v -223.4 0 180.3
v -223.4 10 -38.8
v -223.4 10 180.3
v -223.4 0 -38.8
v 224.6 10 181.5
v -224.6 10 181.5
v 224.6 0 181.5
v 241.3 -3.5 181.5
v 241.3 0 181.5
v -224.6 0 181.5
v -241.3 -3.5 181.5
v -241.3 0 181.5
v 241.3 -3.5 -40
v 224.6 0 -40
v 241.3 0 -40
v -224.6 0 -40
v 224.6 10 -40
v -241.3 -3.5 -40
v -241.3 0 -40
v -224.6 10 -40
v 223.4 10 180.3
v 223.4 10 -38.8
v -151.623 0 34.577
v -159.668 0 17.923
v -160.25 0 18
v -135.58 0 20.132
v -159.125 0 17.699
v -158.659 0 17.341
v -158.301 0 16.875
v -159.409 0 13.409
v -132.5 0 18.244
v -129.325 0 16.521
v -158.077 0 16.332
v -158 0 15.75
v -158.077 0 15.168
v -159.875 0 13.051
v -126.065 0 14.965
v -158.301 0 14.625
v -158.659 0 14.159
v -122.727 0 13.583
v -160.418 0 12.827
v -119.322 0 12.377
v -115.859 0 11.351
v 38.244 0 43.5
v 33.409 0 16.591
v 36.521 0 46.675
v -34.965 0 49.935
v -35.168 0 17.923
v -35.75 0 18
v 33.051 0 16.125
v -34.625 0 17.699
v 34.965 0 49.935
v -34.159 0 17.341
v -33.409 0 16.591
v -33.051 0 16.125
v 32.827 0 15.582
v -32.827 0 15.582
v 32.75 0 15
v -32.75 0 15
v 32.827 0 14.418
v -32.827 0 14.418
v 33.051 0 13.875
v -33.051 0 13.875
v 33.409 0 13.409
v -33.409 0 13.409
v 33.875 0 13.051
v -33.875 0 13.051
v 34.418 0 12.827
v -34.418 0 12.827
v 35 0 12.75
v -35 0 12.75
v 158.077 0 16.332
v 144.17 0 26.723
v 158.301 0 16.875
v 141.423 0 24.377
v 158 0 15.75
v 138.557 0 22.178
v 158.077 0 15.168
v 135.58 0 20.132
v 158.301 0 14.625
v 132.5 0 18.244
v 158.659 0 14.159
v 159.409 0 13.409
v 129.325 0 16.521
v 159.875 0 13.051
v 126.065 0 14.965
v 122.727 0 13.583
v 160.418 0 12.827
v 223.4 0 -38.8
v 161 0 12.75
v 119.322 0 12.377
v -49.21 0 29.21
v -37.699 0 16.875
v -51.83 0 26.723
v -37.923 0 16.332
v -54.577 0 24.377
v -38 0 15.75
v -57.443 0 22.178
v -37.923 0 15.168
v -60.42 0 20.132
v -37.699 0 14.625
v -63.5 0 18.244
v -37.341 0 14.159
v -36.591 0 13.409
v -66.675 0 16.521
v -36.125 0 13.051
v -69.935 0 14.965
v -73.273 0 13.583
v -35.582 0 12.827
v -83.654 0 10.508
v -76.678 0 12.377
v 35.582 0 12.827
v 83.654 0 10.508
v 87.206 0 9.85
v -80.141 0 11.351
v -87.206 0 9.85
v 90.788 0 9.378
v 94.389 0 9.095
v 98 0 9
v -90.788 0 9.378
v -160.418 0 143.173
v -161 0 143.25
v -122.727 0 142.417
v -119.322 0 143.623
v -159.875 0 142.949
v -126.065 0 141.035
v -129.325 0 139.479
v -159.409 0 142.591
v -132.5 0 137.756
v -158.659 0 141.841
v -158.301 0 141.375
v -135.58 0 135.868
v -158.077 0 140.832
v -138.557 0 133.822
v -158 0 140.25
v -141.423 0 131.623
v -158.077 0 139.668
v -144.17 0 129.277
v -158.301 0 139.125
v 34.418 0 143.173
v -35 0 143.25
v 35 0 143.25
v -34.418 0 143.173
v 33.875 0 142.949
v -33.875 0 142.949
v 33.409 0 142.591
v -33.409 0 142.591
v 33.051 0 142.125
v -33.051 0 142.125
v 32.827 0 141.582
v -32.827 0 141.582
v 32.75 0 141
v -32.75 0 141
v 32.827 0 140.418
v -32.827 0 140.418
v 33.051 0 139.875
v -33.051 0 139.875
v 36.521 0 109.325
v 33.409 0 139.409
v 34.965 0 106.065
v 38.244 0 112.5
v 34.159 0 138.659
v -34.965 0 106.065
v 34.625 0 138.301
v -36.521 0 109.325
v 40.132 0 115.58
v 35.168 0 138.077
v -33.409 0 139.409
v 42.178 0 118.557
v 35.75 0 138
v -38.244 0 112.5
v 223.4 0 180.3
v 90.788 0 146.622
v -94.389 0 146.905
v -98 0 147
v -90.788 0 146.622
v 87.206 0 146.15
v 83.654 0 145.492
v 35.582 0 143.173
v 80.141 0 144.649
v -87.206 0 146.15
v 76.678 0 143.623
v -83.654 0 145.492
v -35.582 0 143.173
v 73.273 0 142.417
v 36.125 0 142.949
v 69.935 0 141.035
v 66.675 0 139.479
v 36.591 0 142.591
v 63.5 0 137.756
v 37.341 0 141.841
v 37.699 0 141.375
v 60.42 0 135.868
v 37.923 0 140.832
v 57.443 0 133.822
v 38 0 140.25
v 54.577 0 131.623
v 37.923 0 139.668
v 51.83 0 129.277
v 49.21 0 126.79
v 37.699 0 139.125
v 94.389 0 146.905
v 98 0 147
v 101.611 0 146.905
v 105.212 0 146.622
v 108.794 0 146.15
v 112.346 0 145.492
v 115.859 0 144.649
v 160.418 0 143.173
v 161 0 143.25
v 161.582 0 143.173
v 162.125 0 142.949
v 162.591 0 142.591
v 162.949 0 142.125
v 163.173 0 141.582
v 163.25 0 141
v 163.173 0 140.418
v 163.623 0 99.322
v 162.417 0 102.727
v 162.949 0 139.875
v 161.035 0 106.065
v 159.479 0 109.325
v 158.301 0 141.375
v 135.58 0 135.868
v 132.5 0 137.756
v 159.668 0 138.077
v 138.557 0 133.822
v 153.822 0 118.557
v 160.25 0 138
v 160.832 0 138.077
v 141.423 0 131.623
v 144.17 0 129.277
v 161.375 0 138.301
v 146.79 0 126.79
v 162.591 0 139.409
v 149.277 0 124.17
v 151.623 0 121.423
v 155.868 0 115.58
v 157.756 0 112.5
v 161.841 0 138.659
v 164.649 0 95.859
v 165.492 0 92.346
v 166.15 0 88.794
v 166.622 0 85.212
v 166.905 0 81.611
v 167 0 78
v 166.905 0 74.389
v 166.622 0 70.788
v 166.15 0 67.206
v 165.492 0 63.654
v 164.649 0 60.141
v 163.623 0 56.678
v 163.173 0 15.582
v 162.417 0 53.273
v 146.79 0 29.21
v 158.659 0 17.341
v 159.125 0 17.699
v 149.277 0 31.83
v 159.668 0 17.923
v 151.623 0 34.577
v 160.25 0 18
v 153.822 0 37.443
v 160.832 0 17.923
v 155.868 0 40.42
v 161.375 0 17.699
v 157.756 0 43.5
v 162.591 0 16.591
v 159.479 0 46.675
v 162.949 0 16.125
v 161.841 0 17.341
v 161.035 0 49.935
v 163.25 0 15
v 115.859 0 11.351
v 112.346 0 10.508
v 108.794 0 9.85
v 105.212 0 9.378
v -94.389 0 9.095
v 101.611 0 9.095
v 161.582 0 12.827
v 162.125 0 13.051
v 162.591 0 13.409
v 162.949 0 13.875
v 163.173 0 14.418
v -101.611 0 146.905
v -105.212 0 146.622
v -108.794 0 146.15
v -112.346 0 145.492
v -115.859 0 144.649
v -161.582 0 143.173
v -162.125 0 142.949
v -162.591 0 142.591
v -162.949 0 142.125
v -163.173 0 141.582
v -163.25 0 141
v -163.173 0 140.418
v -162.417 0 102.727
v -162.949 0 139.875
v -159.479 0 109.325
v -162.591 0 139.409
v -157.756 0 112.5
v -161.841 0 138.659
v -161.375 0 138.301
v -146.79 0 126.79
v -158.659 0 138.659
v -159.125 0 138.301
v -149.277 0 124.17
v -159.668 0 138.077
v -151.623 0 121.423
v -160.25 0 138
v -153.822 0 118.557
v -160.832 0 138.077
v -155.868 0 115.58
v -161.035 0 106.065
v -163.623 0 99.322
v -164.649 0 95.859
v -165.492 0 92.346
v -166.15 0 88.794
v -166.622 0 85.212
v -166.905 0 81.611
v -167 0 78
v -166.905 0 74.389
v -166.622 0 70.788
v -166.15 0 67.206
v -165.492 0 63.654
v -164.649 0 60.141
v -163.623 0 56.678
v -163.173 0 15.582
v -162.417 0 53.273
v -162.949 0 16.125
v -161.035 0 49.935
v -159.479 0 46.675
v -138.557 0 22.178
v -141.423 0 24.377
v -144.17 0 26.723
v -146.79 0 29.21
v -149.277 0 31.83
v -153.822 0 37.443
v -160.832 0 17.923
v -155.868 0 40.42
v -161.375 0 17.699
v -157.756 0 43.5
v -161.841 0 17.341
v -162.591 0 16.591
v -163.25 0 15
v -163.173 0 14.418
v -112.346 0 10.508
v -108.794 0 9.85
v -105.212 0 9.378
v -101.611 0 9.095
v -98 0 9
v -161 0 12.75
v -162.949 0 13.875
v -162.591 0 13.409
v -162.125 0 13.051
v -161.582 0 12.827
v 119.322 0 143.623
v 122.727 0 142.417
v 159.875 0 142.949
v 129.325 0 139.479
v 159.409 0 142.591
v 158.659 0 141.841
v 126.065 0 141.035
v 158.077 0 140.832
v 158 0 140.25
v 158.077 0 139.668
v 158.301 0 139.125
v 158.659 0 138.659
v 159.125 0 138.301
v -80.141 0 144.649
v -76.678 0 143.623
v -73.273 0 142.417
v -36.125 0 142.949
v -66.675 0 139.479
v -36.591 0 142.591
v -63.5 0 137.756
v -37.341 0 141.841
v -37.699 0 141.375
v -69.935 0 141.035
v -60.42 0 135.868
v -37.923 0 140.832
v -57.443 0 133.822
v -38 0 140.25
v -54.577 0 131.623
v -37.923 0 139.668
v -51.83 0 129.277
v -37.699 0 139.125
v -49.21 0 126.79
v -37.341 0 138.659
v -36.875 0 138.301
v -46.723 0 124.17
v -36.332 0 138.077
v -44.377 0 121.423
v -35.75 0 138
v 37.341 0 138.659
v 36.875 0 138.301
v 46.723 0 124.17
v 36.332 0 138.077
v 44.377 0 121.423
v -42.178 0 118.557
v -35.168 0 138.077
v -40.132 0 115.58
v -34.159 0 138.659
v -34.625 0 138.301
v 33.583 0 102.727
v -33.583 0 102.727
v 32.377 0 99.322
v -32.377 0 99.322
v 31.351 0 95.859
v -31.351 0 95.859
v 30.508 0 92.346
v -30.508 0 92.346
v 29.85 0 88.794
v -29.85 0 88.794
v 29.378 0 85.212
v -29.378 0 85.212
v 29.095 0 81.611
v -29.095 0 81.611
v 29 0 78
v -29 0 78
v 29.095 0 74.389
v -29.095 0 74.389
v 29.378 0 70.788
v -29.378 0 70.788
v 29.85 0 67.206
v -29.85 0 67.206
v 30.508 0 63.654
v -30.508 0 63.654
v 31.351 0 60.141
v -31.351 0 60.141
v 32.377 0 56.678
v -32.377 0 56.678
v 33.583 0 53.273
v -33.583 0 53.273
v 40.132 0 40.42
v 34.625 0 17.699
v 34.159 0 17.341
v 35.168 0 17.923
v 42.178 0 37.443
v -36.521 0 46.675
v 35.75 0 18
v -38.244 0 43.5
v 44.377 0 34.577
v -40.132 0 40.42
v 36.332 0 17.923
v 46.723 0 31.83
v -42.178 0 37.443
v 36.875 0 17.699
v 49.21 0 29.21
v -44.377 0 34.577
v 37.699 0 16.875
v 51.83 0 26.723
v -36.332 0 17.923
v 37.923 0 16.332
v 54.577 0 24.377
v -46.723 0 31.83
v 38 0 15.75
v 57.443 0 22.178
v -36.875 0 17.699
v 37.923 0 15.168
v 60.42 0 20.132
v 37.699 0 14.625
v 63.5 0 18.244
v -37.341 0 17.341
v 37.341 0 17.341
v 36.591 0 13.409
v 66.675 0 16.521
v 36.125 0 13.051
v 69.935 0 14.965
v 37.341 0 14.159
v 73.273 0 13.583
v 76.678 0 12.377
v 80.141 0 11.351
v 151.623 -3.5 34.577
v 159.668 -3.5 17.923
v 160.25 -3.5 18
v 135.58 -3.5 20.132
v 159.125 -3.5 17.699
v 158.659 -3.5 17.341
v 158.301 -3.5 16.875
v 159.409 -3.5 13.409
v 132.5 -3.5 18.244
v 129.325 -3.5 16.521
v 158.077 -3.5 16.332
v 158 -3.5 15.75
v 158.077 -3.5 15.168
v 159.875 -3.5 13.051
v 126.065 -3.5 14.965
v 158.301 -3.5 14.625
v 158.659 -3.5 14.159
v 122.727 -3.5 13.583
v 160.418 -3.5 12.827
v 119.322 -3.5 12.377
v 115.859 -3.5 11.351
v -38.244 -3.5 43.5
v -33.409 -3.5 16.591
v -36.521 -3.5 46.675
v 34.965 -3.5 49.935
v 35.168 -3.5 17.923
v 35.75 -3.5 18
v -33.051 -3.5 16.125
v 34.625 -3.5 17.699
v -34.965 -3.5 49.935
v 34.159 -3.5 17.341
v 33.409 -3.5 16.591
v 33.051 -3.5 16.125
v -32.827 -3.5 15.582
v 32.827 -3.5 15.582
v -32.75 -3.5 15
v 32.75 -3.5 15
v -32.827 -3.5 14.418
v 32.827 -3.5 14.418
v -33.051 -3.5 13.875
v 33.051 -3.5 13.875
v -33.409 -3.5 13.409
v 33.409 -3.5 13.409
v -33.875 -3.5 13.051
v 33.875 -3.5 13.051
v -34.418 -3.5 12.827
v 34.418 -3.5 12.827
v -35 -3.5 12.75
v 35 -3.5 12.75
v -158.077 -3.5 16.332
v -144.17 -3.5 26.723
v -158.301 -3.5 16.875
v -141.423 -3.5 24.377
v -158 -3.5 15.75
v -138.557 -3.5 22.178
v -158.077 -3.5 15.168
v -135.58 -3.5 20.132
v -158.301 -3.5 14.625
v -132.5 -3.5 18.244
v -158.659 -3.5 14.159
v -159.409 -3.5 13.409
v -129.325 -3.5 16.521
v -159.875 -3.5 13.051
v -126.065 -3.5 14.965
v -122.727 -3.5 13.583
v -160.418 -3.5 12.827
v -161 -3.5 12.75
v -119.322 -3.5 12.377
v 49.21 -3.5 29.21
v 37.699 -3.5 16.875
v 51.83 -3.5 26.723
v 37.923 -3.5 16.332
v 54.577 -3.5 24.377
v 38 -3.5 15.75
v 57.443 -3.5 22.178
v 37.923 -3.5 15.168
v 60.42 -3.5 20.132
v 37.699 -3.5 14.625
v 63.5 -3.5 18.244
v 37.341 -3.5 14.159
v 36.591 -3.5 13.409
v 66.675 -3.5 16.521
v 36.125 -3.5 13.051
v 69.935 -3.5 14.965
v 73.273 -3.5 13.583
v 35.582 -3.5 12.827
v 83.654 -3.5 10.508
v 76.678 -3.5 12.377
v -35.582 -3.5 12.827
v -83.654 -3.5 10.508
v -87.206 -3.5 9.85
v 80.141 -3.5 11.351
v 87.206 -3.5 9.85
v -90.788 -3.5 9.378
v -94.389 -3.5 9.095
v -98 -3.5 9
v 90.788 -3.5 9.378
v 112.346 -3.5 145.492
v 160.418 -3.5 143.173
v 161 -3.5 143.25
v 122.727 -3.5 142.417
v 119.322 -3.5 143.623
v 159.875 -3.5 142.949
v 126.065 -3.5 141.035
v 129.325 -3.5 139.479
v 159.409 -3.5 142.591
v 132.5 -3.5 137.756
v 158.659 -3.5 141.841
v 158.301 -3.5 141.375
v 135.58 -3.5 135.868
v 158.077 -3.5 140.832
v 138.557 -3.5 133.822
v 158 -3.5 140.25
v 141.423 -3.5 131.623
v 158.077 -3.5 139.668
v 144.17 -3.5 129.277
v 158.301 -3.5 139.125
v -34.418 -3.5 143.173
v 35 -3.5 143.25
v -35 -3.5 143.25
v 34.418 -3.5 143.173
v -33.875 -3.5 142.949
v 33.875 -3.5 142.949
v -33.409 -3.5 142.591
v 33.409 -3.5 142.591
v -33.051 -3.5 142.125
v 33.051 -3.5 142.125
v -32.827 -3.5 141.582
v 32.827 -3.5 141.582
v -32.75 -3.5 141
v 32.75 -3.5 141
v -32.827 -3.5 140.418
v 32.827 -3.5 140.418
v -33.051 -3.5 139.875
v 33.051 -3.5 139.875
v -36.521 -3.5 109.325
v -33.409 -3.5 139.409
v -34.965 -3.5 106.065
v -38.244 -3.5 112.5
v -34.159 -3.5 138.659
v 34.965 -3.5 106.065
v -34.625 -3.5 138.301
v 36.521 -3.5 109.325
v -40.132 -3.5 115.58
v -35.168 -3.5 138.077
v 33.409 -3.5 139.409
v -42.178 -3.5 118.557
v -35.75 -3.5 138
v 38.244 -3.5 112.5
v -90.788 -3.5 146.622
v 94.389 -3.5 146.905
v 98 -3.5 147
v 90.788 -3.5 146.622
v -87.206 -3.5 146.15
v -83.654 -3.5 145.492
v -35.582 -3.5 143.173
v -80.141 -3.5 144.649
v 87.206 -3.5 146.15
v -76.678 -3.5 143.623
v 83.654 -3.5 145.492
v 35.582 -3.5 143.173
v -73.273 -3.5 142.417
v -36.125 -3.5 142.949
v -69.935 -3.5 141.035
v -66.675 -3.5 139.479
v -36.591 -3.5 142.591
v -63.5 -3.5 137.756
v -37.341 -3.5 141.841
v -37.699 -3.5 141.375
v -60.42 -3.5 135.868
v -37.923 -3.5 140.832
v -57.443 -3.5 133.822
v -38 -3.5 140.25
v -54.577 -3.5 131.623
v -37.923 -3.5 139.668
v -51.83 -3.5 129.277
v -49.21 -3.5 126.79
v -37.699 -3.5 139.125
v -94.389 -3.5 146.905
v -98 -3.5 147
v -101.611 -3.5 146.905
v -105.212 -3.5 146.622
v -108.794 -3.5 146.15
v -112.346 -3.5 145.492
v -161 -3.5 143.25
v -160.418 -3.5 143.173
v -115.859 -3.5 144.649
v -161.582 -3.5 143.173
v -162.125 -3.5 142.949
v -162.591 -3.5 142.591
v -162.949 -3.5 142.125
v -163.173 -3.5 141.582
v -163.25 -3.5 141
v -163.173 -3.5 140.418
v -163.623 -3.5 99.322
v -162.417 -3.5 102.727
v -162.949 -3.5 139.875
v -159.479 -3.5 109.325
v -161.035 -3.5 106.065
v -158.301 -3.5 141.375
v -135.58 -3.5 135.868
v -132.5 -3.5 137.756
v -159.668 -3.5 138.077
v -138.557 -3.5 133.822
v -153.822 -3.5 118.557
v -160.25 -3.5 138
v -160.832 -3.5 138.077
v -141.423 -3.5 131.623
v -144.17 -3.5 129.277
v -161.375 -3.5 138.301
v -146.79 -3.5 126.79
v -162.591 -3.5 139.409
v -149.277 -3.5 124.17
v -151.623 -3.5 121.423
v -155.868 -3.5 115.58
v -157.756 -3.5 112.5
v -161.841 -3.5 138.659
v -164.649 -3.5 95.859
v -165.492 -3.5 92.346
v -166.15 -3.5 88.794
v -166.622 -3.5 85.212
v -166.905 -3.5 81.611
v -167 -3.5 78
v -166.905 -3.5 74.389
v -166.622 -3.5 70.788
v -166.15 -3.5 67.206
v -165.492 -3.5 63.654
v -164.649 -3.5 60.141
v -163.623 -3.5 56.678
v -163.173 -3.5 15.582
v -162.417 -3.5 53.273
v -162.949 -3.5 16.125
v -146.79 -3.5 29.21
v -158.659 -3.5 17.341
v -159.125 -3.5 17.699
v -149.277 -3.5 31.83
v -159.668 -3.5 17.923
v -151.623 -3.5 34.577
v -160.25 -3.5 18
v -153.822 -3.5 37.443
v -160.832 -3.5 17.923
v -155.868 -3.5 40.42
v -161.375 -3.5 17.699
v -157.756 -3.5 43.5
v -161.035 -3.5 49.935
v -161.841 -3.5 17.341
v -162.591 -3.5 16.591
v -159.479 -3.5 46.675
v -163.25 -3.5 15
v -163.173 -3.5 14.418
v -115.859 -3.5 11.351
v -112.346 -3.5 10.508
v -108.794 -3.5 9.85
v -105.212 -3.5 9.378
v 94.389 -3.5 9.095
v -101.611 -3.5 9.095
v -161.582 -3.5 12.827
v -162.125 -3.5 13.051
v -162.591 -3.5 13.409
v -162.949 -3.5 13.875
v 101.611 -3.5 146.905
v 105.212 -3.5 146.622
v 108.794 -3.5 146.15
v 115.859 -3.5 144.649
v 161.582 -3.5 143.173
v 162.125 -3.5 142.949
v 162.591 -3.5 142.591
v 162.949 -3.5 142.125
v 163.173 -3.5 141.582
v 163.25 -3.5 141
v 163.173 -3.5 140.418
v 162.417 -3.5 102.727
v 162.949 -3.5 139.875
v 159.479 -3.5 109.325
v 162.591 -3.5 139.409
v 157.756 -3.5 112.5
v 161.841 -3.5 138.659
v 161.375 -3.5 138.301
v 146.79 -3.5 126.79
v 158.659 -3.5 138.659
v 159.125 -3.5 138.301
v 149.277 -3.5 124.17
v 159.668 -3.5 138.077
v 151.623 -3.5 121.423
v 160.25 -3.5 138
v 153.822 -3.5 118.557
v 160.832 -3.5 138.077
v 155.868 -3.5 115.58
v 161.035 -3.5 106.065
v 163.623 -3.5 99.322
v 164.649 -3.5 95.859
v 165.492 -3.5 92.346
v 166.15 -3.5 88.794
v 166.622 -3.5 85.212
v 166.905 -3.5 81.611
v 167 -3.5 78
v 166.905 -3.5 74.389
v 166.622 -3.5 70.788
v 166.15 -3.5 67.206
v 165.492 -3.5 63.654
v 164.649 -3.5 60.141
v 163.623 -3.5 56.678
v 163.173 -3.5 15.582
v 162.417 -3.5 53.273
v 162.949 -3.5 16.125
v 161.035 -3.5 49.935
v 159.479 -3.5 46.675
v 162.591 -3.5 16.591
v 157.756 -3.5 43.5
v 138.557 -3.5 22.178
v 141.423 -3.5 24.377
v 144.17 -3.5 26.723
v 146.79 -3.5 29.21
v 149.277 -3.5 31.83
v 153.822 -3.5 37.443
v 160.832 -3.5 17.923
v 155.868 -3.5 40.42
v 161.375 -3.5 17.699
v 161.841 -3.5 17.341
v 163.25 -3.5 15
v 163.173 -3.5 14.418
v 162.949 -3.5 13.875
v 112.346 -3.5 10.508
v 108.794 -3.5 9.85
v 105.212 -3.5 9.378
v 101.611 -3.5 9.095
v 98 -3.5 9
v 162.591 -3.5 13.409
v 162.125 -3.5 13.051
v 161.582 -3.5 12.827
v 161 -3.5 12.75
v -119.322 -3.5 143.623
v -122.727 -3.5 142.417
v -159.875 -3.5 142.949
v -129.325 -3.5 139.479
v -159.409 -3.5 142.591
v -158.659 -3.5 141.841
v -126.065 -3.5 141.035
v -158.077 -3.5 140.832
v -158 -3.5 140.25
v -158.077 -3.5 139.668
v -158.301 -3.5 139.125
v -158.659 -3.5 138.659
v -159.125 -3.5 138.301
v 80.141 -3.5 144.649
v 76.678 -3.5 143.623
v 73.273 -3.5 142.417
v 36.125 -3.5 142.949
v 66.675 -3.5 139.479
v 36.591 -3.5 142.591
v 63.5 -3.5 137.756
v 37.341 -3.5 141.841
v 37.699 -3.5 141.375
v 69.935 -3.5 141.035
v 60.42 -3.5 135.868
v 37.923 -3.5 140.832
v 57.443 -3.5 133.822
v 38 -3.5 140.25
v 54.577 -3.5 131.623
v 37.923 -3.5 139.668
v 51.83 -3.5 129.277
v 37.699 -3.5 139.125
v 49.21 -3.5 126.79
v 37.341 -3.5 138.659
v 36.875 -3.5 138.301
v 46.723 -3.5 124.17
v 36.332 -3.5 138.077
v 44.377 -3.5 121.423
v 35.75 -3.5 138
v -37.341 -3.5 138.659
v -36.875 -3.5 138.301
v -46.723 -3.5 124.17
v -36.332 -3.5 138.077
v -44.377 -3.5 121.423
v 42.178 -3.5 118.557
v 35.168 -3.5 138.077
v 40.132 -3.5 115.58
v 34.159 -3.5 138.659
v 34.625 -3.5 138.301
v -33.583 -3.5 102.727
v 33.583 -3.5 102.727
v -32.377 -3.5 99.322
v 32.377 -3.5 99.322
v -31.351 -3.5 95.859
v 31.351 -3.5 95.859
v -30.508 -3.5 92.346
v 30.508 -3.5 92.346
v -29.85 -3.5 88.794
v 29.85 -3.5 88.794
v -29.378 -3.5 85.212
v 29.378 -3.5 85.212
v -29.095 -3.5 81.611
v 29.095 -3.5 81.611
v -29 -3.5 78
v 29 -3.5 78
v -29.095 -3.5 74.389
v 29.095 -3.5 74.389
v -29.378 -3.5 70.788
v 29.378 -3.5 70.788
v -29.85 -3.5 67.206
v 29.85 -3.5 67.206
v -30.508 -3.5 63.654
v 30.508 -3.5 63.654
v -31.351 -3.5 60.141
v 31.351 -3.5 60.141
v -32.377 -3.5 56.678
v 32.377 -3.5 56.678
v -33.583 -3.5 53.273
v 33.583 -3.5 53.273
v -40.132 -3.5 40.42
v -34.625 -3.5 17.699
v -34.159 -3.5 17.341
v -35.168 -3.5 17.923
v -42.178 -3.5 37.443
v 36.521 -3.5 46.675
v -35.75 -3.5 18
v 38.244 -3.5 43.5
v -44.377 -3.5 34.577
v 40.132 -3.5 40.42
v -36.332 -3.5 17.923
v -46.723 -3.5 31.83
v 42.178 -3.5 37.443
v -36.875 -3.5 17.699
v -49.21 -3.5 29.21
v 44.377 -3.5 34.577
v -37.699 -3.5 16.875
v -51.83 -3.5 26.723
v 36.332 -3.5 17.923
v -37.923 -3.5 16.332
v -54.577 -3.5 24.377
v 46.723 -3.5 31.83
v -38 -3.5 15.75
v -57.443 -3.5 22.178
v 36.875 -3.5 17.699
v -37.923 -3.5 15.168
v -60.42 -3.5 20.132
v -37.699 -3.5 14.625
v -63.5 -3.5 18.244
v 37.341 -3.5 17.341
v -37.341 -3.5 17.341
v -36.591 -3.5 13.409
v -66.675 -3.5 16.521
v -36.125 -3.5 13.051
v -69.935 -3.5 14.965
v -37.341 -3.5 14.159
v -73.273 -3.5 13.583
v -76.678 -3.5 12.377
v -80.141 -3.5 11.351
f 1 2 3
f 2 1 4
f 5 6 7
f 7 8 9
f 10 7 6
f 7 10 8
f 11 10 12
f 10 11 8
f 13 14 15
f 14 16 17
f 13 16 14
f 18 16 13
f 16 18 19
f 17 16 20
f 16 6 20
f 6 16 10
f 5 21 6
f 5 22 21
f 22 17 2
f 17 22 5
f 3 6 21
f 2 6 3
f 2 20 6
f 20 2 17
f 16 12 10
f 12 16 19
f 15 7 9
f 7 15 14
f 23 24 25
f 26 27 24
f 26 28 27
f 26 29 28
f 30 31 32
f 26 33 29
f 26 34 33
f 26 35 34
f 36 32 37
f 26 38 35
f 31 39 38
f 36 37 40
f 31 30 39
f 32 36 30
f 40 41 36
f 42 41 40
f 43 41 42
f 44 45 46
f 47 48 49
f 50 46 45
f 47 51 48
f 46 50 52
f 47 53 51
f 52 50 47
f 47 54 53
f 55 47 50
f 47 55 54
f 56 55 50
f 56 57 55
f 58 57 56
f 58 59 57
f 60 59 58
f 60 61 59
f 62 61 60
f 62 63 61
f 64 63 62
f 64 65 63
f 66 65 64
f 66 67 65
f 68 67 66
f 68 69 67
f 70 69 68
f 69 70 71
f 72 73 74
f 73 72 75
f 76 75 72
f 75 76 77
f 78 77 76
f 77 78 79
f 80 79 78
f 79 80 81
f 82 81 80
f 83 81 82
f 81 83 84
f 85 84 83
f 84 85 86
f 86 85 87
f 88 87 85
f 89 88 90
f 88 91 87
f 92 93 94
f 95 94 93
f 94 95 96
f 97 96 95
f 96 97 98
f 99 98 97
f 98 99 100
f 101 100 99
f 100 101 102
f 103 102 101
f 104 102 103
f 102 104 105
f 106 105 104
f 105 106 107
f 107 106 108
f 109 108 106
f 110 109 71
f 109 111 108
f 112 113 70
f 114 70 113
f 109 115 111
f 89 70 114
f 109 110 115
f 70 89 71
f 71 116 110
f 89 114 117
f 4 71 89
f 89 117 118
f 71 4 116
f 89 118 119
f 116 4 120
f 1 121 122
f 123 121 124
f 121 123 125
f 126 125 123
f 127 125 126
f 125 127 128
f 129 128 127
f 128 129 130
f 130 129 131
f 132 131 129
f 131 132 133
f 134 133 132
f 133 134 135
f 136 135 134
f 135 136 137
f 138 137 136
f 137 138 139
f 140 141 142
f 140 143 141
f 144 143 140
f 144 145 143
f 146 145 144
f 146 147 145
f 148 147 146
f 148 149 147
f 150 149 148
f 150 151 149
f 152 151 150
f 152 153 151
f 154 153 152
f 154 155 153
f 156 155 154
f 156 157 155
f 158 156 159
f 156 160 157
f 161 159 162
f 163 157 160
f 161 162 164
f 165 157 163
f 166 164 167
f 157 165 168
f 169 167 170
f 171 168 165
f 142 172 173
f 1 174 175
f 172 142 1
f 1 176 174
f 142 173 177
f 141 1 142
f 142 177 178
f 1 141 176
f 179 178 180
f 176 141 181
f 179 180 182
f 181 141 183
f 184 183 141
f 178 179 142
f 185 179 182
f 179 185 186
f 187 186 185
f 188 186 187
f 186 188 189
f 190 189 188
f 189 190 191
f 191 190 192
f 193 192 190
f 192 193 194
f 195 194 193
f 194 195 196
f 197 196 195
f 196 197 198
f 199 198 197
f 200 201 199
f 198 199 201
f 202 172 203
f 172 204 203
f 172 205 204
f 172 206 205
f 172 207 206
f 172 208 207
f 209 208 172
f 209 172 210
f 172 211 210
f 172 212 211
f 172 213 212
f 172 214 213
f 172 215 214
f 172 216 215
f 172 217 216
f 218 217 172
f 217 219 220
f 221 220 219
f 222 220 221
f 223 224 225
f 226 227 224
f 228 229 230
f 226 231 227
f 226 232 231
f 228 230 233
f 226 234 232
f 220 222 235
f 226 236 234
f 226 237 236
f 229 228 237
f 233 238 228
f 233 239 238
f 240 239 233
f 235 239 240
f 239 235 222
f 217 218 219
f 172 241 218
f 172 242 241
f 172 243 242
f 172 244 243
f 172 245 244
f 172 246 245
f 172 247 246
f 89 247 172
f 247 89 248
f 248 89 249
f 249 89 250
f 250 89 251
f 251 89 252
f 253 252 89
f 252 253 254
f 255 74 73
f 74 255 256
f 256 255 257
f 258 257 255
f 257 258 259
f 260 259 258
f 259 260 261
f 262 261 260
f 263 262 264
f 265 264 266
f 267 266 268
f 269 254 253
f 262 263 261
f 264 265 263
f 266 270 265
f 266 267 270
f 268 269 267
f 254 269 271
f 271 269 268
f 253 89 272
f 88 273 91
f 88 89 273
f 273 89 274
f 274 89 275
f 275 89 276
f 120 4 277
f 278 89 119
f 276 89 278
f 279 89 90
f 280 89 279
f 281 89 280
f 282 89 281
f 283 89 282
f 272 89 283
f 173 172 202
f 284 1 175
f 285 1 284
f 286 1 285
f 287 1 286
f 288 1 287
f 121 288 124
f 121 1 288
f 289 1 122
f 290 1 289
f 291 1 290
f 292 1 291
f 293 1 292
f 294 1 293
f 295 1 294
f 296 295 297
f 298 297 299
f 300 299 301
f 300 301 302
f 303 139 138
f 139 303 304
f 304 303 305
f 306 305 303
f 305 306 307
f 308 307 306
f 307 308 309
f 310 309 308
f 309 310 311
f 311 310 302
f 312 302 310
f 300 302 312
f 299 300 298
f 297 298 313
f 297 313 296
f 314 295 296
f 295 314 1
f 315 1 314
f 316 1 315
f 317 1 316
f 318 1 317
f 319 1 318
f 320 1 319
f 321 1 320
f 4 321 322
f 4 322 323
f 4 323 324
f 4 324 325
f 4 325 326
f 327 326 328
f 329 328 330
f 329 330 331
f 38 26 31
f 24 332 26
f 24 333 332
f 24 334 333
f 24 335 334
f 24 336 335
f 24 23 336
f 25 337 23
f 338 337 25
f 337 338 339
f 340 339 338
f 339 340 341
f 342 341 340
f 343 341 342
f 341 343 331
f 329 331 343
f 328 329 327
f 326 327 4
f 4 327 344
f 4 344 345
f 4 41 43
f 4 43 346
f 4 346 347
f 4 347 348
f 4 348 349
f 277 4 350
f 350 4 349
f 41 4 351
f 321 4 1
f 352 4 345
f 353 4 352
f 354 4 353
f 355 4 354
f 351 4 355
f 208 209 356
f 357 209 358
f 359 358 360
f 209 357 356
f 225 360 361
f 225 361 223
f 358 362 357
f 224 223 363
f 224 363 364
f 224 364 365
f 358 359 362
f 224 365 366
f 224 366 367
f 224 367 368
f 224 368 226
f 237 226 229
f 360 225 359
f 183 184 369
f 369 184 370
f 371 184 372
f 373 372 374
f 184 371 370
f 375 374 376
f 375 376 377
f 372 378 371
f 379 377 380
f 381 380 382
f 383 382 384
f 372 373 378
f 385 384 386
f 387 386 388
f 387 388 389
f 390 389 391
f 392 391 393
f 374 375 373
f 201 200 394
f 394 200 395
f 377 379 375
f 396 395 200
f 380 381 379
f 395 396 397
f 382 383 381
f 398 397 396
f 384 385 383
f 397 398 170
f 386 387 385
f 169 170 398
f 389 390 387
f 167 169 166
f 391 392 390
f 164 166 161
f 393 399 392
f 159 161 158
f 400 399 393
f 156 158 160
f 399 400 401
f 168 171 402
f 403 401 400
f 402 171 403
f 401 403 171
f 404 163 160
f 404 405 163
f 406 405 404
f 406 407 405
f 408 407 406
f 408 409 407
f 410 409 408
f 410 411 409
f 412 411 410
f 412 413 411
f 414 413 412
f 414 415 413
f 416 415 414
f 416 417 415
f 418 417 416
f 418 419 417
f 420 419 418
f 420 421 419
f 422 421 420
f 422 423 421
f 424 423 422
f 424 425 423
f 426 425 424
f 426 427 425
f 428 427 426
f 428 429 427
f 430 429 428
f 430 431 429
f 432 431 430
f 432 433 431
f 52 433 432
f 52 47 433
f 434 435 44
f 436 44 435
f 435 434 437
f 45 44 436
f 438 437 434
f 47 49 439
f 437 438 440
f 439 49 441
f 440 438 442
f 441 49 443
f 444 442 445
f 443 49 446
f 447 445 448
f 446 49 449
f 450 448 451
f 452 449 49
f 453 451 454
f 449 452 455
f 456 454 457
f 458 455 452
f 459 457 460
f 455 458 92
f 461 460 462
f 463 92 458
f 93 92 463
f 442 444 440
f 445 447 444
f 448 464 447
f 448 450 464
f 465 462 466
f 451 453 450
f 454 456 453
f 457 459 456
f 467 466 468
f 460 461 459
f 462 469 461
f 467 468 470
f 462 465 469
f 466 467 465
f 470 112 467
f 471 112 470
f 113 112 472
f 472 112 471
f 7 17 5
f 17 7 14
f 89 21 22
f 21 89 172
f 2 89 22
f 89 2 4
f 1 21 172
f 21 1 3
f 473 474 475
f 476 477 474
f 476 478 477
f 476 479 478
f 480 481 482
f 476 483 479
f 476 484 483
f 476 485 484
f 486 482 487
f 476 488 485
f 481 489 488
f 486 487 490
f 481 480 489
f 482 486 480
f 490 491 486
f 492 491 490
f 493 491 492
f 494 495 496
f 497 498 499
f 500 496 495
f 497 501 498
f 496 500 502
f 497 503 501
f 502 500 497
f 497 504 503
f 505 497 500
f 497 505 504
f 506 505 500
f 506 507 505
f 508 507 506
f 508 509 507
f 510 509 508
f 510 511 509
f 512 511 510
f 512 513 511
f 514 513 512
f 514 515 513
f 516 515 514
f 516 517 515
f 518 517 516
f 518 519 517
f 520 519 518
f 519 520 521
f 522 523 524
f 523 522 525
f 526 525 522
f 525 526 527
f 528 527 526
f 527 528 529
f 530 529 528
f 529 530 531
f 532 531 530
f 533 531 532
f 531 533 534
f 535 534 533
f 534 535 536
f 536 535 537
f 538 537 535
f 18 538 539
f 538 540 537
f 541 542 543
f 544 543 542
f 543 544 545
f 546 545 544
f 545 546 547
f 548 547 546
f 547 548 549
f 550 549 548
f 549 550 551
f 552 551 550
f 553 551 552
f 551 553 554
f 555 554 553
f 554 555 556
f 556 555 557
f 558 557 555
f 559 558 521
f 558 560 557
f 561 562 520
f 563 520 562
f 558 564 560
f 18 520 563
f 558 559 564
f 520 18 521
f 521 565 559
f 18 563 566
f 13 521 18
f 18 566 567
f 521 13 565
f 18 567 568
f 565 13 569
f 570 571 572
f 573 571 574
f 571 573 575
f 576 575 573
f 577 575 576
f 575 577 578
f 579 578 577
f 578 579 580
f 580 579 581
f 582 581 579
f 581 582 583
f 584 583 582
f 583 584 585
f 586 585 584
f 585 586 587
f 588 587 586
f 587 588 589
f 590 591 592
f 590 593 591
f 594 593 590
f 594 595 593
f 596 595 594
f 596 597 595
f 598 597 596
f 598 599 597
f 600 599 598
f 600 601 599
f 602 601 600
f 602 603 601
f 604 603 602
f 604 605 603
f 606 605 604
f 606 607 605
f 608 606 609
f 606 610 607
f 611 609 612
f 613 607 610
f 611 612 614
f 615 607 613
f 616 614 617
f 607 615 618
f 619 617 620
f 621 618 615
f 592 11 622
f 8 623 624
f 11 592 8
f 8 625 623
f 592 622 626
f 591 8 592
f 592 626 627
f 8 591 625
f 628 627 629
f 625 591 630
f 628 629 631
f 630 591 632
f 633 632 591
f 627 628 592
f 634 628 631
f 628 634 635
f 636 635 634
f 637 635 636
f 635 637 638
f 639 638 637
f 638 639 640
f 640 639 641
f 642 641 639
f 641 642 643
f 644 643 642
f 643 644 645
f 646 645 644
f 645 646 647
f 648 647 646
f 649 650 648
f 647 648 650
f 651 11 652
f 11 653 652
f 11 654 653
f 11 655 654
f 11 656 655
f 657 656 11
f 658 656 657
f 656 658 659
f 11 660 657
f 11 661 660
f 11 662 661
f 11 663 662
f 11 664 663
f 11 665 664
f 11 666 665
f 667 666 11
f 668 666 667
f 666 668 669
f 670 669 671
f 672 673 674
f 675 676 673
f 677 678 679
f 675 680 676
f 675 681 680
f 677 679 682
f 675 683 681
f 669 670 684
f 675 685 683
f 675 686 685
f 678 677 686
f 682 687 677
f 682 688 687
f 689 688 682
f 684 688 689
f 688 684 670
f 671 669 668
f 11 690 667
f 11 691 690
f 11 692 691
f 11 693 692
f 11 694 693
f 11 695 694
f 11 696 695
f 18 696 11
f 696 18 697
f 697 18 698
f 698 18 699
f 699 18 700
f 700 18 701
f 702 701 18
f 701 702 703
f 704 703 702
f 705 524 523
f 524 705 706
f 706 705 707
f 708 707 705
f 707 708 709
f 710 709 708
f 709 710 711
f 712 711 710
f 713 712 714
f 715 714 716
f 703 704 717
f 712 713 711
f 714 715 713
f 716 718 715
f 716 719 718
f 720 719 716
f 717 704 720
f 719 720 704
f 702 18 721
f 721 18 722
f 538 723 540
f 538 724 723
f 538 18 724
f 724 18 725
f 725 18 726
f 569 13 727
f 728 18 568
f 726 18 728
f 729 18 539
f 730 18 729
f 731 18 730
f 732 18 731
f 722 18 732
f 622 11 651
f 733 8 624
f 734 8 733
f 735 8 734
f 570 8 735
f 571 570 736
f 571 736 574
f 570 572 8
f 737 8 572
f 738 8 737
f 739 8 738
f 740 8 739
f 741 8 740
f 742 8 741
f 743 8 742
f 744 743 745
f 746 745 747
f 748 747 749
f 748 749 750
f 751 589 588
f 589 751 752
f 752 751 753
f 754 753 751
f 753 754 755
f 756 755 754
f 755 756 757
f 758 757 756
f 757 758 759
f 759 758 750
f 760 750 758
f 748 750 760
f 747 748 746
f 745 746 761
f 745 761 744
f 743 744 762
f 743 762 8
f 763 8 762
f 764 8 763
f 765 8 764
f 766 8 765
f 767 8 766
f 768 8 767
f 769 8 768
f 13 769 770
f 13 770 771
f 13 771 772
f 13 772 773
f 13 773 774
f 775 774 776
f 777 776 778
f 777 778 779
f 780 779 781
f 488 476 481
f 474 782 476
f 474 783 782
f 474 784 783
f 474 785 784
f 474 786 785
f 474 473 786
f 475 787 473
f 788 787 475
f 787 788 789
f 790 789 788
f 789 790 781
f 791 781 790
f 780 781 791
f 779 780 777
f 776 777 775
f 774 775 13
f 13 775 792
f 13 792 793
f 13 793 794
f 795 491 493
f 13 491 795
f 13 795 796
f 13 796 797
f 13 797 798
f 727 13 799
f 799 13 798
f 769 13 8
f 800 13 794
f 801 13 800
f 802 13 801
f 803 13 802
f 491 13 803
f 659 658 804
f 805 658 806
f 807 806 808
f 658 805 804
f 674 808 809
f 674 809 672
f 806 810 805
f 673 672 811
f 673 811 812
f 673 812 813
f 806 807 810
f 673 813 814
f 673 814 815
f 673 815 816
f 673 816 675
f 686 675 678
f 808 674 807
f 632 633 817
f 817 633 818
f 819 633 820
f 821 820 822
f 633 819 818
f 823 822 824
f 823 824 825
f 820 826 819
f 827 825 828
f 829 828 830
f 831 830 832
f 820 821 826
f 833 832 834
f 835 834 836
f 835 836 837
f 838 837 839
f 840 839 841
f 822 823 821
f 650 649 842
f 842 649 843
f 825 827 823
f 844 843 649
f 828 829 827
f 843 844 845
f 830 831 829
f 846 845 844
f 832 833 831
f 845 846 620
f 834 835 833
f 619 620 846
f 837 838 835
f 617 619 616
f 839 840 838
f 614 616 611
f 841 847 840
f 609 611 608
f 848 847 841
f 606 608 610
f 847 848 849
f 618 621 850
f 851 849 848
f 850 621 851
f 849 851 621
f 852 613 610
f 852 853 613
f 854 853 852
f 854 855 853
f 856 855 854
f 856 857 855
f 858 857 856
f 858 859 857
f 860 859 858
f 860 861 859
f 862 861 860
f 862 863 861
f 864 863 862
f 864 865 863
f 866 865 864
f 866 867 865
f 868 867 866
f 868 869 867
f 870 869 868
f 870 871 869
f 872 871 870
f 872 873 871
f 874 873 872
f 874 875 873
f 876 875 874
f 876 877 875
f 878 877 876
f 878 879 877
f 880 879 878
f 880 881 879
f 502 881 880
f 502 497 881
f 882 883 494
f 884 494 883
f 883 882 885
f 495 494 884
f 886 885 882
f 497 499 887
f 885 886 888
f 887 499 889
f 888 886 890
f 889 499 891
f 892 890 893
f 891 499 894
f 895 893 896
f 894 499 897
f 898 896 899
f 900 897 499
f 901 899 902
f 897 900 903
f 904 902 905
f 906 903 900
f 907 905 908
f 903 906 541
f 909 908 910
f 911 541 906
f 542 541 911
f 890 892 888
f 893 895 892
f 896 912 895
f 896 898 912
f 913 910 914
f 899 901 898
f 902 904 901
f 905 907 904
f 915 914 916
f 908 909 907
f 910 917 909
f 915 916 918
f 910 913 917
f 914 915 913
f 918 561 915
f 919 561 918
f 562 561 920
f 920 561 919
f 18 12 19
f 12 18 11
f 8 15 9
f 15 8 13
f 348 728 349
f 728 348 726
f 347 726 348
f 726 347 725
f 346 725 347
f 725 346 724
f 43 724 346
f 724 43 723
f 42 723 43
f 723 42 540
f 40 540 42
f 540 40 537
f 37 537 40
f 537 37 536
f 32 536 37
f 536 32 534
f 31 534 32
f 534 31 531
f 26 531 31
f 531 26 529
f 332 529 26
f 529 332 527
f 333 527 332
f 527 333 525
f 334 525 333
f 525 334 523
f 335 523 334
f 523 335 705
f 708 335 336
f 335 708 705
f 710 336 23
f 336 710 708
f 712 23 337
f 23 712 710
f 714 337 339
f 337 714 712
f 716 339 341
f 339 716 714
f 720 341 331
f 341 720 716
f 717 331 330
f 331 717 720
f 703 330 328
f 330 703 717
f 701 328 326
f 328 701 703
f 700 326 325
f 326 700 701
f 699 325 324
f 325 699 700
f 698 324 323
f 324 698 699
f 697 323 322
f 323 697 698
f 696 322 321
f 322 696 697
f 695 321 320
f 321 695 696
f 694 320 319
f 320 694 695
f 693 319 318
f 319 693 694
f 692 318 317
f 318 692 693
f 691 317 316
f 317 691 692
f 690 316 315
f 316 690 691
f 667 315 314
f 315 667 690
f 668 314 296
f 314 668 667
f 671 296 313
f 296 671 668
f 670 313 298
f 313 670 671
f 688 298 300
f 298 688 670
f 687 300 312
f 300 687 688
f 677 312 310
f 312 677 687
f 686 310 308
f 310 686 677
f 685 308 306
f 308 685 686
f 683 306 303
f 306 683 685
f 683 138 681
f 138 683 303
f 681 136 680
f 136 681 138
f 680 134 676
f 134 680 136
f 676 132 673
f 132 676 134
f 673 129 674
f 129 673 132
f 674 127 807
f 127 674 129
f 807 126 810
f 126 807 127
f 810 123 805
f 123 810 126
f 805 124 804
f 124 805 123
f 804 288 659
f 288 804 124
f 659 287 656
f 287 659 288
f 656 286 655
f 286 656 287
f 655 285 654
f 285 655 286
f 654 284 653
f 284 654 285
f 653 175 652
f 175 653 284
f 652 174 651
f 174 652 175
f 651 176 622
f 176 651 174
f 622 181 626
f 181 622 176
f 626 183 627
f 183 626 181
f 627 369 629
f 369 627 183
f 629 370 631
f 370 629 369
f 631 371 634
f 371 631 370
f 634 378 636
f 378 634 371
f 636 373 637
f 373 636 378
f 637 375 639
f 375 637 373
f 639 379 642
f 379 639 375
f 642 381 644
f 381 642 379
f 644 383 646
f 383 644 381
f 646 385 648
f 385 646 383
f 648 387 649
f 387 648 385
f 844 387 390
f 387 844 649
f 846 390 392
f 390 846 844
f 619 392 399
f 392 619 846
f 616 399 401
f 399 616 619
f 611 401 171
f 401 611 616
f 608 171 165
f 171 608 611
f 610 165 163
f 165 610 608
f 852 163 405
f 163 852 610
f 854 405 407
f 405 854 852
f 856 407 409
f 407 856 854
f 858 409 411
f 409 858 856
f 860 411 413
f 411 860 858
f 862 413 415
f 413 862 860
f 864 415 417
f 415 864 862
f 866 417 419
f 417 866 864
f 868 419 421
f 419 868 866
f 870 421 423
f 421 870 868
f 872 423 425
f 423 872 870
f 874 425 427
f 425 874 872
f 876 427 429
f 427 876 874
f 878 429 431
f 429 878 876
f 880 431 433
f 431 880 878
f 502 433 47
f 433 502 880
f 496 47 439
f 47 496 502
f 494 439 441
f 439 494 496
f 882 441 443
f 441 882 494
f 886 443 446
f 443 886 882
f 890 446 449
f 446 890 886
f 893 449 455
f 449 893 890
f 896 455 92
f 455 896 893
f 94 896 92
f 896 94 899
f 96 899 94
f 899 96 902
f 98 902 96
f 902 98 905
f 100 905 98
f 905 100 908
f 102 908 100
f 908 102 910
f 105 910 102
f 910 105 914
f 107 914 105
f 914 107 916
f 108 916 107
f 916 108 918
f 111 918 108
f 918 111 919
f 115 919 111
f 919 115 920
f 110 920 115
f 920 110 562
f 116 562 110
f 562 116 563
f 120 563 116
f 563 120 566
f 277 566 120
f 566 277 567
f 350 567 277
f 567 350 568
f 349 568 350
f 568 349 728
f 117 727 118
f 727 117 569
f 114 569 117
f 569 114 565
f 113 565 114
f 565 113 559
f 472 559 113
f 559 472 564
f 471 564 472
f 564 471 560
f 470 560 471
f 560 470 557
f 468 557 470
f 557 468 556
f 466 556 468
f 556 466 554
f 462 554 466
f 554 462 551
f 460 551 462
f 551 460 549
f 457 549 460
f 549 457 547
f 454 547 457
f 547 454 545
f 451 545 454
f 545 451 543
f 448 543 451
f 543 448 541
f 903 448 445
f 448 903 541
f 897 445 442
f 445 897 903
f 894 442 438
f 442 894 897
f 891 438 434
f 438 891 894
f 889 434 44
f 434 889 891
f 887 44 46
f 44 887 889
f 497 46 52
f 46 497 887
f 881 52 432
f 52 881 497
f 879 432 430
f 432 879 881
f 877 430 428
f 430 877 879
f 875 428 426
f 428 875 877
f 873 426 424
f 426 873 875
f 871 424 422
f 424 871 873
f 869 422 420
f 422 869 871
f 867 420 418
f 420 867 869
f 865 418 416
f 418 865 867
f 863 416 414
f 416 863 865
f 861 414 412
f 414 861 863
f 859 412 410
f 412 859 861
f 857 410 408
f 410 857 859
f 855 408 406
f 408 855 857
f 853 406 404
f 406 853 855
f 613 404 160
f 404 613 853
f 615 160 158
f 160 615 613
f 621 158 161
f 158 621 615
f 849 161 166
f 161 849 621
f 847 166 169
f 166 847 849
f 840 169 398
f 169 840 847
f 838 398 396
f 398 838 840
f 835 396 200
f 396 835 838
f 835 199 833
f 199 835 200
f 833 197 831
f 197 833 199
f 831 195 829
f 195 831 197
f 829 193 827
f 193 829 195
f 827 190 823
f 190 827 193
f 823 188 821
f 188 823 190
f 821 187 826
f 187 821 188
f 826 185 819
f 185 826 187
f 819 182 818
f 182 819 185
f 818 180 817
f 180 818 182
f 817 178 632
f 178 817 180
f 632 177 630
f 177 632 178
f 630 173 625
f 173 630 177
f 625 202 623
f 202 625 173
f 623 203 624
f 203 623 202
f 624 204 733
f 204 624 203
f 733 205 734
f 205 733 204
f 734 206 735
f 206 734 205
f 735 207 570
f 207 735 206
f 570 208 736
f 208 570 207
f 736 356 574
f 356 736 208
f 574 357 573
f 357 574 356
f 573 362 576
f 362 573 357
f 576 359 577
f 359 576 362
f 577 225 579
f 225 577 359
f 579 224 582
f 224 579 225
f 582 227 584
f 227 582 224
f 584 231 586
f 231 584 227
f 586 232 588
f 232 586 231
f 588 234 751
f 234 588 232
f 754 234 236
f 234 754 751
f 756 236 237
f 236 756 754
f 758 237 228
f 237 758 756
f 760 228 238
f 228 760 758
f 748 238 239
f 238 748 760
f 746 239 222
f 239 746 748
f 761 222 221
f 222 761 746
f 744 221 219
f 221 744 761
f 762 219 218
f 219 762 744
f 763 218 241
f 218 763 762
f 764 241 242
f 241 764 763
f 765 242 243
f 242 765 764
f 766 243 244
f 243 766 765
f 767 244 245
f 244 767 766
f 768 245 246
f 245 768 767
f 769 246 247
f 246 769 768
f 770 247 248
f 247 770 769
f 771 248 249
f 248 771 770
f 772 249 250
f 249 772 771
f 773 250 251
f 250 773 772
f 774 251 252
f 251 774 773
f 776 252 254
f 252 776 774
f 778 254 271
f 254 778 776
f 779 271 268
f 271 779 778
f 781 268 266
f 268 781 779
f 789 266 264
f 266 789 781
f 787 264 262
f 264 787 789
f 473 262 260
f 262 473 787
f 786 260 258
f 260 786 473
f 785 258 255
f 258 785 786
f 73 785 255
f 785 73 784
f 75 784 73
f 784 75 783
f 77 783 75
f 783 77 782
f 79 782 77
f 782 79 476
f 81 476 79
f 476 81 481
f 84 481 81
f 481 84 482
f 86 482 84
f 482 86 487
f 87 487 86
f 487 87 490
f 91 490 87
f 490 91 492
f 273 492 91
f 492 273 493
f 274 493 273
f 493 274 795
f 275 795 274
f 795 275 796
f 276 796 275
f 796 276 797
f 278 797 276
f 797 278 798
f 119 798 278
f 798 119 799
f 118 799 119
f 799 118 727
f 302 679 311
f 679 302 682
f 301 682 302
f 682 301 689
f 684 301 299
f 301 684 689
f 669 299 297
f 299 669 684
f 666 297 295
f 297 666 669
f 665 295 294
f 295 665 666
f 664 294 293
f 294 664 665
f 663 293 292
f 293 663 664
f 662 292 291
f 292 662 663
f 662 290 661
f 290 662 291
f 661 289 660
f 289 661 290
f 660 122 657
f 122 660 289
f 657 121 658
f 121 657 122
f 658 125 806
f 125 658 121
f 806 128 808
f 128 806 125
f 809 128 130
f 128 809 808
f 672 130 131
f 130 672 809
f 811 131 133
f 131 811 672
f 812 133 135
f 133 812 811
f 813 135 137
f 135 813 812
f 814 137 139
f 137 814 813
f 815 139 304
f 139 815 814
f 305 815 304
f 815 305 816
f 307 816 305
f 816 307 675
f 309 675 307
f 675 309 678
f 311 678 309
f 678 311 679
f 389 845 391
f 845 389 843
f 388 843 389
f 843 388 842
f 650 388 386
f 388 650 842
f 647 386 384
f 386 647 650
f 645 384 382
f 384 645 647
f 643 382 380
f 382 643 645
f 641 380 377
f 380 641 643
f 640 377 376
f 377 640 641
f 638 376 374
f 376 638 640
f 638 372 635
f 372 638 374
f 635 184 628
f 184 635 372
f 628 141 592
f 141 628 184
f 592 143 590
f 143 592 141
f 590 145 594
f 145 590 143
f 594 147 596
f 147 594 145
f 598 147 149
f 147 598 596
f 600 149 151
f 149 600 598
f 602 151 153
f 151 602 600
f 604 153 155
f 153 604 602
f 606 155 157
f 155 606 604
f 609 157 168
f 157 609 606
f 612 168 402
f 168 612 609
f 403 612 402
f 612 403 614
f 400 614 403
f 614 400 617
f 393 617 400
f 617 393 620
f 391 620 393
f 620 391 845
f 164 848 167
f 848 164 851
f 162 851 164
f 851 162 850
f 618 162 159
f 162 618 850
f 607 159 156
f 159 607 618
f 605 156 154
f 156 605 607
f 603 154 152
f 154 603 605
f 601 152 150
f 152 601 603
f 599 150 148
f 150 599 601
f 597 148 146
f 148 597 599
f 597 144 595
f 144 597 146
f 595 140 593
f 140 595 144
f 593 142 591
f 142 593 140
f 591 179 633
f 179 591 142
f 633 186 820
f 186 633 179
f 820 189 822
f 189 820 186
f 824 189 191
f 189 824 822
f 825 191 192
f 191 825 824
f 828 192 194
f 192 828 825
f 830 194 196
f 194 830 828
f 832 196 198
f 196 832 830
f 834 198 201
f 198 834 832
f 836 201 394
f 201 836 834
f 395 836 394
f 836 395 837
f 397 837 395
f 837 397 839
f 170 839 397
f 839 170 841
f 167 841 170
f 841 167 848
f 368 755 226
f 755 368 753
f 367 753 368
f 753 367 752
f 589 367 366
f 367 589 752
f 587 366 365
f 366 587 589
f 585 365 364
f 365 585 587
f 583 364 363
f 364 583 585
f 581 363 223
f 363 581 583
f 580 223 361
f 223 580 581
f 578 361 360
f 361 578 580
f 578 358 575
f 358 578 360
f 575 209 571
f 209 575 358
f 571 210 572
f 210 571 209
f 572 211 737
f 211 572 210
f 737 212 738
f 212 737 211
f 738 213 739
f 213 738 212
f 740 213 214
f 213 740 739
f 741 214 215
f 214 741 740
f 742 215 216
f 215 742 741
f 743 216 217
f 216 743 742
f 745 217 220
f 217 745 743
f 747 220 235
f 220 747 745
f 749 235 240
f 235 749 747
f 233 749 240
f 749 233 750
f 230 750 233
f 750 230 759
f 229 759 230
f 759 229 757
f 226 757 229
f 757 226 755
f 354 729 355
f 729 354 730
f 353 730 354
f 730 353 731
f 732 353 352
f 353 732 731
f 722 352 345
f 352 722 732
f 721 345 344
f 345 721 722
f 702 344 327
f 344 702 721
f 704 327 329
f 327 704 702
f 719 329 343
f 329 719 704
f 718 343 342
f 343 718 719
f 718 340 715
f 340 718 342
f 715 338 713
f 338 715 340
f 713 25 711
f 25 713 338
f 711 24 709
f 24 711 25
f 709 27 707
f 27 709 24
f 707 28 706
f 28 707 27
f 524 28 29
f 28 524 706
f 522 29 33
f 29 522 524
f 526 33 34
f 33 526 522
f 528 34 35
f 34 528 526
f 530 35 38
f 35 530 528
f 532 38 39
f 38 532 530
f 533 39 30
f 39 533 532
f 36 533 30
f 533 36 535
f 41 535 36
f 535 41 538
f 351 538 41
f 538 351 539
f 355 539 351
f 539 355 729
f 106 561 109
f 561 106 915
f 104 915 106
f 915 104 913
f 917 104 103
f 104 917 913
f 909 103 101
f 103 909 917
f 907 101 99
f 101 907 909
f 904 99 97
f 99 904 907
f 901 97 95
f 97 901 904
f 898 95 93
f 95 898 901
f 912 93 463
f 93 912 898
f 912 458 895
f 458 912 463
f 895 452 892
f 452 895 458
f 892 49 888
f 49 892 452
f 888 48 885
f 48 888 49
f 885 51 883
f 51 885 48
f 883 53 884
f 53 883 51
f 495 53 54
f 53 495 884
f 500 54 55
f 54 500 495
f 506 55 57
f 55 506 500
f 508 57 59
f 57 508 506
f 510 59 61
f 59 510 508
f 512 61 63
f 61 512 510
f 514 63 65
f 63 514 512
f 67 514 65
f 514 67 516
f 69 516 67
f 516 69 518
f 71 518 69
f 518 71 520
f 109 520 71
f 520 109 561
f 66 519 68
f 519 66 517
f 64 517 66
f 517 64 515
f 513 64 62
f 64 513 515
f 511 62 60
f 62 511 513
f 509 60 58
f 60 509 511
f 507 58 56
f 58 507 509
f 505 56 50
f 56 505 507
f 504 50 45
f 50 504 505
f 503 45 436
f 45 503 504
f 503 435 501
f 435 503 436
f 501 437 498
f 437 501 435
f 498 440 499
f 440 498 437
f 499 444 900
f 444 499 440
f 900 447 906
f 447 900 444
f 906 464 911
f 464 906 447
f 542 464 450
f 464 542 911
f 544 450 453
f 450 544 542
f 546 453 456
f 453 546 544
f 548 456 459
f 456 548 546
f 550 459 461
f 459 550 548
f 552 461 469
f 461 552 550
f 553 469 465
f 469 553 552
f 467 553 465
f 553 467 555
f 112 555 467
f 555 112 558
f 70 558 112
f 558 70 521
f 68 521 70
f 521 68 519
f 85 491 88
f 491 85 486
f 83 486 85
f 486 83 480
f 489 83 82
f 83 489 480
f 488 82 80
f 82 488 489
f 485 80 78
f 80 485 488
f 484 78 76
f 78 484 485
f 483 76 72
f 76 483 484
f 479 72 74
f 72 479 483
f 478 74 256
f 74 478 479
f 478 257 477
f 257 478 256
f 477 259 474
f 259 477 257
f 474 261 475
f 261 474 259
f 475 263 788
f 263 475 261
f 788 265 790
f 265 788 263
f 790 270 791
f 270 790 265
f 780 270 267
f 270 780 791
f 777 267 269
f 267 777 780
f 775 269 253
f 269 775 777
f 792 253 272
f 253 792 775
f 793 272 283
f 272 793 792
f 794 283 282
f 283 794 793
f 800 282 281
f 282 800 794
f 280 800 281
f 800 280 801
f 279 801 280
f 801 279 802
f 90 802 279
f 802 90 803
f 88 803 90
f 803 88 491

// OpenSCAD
// file: lib/shapes.scad
/*
 * Вспомогательные примитивы. Подключать через use <lib/shapes.scad>.
 */

// Прямоугольник со скруглёнными углами, центрированный в (0,0)
module rrect(w, h, r, fn = 32) {
    r_ = min(r, w / 2 - 0.01, h / 2 - 0.01);
    hull()
        for (sx = [-1, 1], sy = [-1, 1])
            translate([sx * (w / 2 - r_), sy * (h / 2 - r_)])
                circle(r = r_, $fn = fn);
}

// Капсула (slot) длиной l по X, шириной w, центрирована
module slot2d(l, w, fn = 24) {
    hull()
        for (sx = [-1, 1])
            translate([sx * (l - w) / 2, 0]) circle(d = w, $fn = fn);
}

// Скруглённый по вертикальным рёбрам параллелепипед, угол в начале координат
module rbox(size, r, fn = 32) {
    translate([size[0] / 2, size[1] / 2, 0])
        linear_extrude(height = size[2])
            rrect(size[0], size[1], r, fn);
}

// Плавная интерполяция (нулевой наклон на концах → эквивалент большого радиуса)
function smoothstep(t) = t * t * (3 - 2 * t);
function lerp(a, b, t) = a + (b - a) * t;

/*
 * Лофт по Y между двумя скруглёнными прямоугольниками в плоскости XZ.
 * Сечение задано: центр [cx, cz], ширина w, высота h, радиус r.
 * Профиль перехода: smoothstep → тангенциально-непрерывный вход и выход.
 * y0..y1 — продольные координаты. n — число ломтей.
 */
module loft_xz(y0, y1, s0, s1, n = 24, fn = 32) {
    L = y1 - y0;
    for (i = [0 : n - 1]) {
        t0 = i / n;
        t1 = (i + 1) / n;
        hull() {
            section_slab(y0 + t0 * L, s0, s1, smoothstep(t0), fn);
            section_slab(y0 + t1 * L, s0, s1, smoothstep(t1), fn);
        }
    }
}

// Тонкий ломоть сечения на координате y, s = [cx, cz, w, h, r]
module section_slab(y, s0, s1, u, fn) {
    cx = lerp(s0[0], s1[0], u);
    cz = lerp(s0[1], s1[1], u);
    w  = lerp(s0[2], s1[2], u);
    h  = lerp(s0[3], s1[3], u);
    r  = lerp(s0[4], s1[4], u);
    translate([cx, y, cz])
        rotate([90, 0, 0])
            translate([0, 0, -0.005])
                linear_extrude(height = 0.01)
                    rrect(w, h, r, fn);
}

// Отверстие вдоль Y (сквозное), центр (x, z), на глубине от y0 длиной l
module hole_y(x, z, d, y0, l, fn = 32) {
    translate([x, y0 - 0.01, z])
        rotate([-90, 0, 0])
            cylinder(h = l + 0.02, d = d, $fn = fn);
}

// Шестигранное гнездо под гайку вдоль Y
module hex_pocket_y(x, z, af, h, y0) {
    translate([x, y0 - 0.01, z])
        rotate([-90, 0, 0])
            cylinder(h = h + 0.01, d = af / cos(30), $fn = 6);
}

// --- Макеты (не для печати) -------------------------------------------------
module fan_mockup(size = 140, t = 25, hub = 45, hole_pitch = 124.5) {
    // Рамка
    color([0.08, 0.08, 0.09, 0.9])
    difference() {
        translate([0, t, 0]) rotate([90, 0, 0])
            linear_extrude(height = t) rrect(size, size, 6);
        translate([0, t + 0.1, 0]) rotate([90, 0, 0])
            linear_extrude(height = t + 0.2) circle(d = size - 3, $fn = 96);
        for (sx = [-1, 1], sz = [-1, 1])
            hole_y(sx * hole_pitch / 2, sz * hole_pitch / 2, 4.4, -1, t + 2);
    }
    // Ступица и лопасти (условно)
    color([0.45, 0.35, 0.25, 0.95])
    translate([0, t / 2, 0]) rotate([90, 0, 0]) {
        cylinder(h = t * 0.6, d = hub, center = true, $fn = 48);
        for (i = [0 : 6])
            rotate(i * 360 / 7)
                hull() {
                    translate([hub / 2 - 2, -3, 0]) cylinder(h = 2, r = 3, center = true);
                    translate([size / 2 - 10, 10, 0]) cylinder(h = 2, r = 6, center = true);
                }
    }
}

// Паз отверстия вентилятора: hull двух окружностей на межцентровых pmin и pmax
// (sx, sz — квадрант, ±1). 2D, центр вентилятора в (0,0).
module fan_hole_slot2d(sx, sz, pmin, pmax, d, fn = 24) {
    hull() for (p = [pmin, pmax]) translate([sx * p / 2, sz * p / 2]) circle(d = d, $fn = fn);
}

/*
 * Макет MSI EdgeXpert по замерам. Начало координат — левый-передний-нижний угол
 * КОРПУСА (без ножек); ножки уходят в −z. «Левый» — при взгляде спереди.
 *   hc = [w, h, z0]           — сотовая полоса на передней грани (центр по ширине)
 *   bv = [w, d, x0, y0]       — нижняя решётка (x0 от левого края, y0 от передней грани)
 *   rx = [w, h, top]          — задний выхлоп (центр по ширине, top — от верха)
 *   ft = [dia, h, inset_x, inset_y]
 */
module device_mockup(w, d, h, hc, bv, rx, ft) {
    color([0.14, 0.15, 0.16, 0.85]) cube([w, d, h]);
    color([0.35, 0.65, 0.95, 0.95])            // соты — вход
        translate([(w - hc[0]) / 2, -0.4, hc[2]]) cube([hc[0], 0.4, hc[1]]);
    color([0.95, 0.45, 0.3, 0.95])             // задний выхлоп
        translate([(w - rx[0]) / 2, d, h - rx[2] - rx[1]]) cube([rx[0], 0.4, rx[1]]);
    color([0.35, 0.65, 0.95, 0.95])            // нижняя решётка
        translate([bv[2], bv[3], -0.4]) cube([bv[0], bv[1], 0.4]);
    color([0.2, 0.2, 0.2])                     // ножки
        for (fx = [ft[2], w - ft[2]], fy = [ft[3], d - ft[3]])
            translate([fx, fy, -ft[1]]) cylinder(h = ft[1], d = ft[0], $fn = 32);
}
// main file
/*
 * front_panel.scad — фронтальная панель ЦМО ФП-5 (покупная, сталь RAL 7035)
 * с разметкой:
 *   - два выреза Ø fan_open_dia на x = ±track_pitch/2, ось = shelf_top_z + 78;
 *   - по 4 паза M4 на межцентровом 124.5…126 вокруг каждого выреза;
 *   - 4 отверстия Ø4.5 под печатные уголки panel↔base_plate — только при
 *     use_panel_brackets (сейчас false: крепление через штатные отверстия);
 *   - над каждым вентилятором — 2 × Ø3.4 под лапки рамки контроллера и Ø12 под
 *     втулку кабелей, ТОЛЬКО если габариты контроллера измерены (ctrl_*);
 *   - отверстия ушей — справочно, если заданы ear_hole_* (не режутся).
 * Деталь не печатается; 2D-разметка — docs/drawings/panel_fp5.svg.
 *
 * Координаты модуля: x=0 — ось панели; y=0 — задняя плоскость панели (лист в
 * y ∈ [−panel_t, 0], отбортовка — в +Y); z=0 — верх полки, низ панели на −shelf_top_z.
 */

include <params.scad>
use <lib/shapes.scad>

part = "panel"; // [panel, panel_2d]

// 2D-вырезы в координатах панели: x от оси, z от нижнего края
module panel_cutouts_2d() {
    for (cx = fan_cx_from_center) {
        translate([cx, fan_center_z_panel]) {
            circle(d = fan_open_dia, $fn = 120);
            for (sx = [-1, 1], sz = [-1, 1])
                fan_hole_slot2d(sx, sz, fan_hole_pitch_min, fan_hole_pitch_max, fan_hole_dia);
        }
        if (ctrl_known) {
            for (sx = [-1, 1]) translate([cx + sx * bezel_lug_dx, bezel_cz_panel]) circle(d = m3_clear_d, $fn = 24);
            translate([cx + sign(cx) * cable_hole_side * cable_hole_dx, bezel_cz_panel]) circle(d = cable_hole_d, $fn = 48);
        }
    }
    // печатные уголки panel↔base_plate (опция)
    if (use_panel_brackets)
        for (sx = [-1, 1], zl = bracket_hole_zl)
            translate([sx * bracket_cx, shelf_top_z + base_plate_t + zl]) circle(d = bracket_hole_d, $fn = 24);
}

module panel_outline_2d() { translate([-panel_w / 2, 0]) square([panel_w, panel_h]); }

module panel_2d() {
    rack_checks();
    if (ctrl_known) ctrl_checks();
    difference() { panel_outline_2d(); panel_cutouts_2d(); }
}

module panel() {
    rack_checks();
    if (ctrl_known) ctrl_checks();
    color(panel_color) translate([0, 0, -shelf_top_z]) {
        rotate([90, 0, 0]) linear_extrude(height = panel_t)
            difference() { panel_outline_2d(); panel_cutouts_2d(); }
        // отбортовка по периметру (назад на panel_fold); боковая — в пределах проёма стоек
        for (sx = [-1, 1])
            translate([sx * (rack_opening_w / 2 - 1) - 0.6, 0, 0]) cube([1.2, panel_fold, panel_h]);
        for (z0 = [0, panel_h - 1.2])
            translate([-rack_opening_w / 2 + 1, 0, z0]) cube([rack_opening_w - 2, panel_fold, 1.2]);
    }
}

echo(str("[PANEL] cutouts Ø", fan_open_dia, " at x=±", track_pitch / 2, ", z=", fan_center_z_panel,
         " from bottom edge (allowed ", fan_center_z_panel_min, "..", fan_center_z_panel_max,
         "); M4 slots ", fan_hole_pitch_min, "…", fan_hole_pitch_max,
         use_panel_brackets ? str("; bracket holes x=±", bracket_cx, " z=", [for (zl = bracket_hole_zl) shelf_top_z + base_plate_t + zl])
                            : "; no bracket holes (stock holes)",
         ctrl_known ? str("; bezel lugs z=", bezel_cz_panel) : "; bezel holes: after controller is measured"));

if (part == "panel_2d") panel_2d();
else panel();
